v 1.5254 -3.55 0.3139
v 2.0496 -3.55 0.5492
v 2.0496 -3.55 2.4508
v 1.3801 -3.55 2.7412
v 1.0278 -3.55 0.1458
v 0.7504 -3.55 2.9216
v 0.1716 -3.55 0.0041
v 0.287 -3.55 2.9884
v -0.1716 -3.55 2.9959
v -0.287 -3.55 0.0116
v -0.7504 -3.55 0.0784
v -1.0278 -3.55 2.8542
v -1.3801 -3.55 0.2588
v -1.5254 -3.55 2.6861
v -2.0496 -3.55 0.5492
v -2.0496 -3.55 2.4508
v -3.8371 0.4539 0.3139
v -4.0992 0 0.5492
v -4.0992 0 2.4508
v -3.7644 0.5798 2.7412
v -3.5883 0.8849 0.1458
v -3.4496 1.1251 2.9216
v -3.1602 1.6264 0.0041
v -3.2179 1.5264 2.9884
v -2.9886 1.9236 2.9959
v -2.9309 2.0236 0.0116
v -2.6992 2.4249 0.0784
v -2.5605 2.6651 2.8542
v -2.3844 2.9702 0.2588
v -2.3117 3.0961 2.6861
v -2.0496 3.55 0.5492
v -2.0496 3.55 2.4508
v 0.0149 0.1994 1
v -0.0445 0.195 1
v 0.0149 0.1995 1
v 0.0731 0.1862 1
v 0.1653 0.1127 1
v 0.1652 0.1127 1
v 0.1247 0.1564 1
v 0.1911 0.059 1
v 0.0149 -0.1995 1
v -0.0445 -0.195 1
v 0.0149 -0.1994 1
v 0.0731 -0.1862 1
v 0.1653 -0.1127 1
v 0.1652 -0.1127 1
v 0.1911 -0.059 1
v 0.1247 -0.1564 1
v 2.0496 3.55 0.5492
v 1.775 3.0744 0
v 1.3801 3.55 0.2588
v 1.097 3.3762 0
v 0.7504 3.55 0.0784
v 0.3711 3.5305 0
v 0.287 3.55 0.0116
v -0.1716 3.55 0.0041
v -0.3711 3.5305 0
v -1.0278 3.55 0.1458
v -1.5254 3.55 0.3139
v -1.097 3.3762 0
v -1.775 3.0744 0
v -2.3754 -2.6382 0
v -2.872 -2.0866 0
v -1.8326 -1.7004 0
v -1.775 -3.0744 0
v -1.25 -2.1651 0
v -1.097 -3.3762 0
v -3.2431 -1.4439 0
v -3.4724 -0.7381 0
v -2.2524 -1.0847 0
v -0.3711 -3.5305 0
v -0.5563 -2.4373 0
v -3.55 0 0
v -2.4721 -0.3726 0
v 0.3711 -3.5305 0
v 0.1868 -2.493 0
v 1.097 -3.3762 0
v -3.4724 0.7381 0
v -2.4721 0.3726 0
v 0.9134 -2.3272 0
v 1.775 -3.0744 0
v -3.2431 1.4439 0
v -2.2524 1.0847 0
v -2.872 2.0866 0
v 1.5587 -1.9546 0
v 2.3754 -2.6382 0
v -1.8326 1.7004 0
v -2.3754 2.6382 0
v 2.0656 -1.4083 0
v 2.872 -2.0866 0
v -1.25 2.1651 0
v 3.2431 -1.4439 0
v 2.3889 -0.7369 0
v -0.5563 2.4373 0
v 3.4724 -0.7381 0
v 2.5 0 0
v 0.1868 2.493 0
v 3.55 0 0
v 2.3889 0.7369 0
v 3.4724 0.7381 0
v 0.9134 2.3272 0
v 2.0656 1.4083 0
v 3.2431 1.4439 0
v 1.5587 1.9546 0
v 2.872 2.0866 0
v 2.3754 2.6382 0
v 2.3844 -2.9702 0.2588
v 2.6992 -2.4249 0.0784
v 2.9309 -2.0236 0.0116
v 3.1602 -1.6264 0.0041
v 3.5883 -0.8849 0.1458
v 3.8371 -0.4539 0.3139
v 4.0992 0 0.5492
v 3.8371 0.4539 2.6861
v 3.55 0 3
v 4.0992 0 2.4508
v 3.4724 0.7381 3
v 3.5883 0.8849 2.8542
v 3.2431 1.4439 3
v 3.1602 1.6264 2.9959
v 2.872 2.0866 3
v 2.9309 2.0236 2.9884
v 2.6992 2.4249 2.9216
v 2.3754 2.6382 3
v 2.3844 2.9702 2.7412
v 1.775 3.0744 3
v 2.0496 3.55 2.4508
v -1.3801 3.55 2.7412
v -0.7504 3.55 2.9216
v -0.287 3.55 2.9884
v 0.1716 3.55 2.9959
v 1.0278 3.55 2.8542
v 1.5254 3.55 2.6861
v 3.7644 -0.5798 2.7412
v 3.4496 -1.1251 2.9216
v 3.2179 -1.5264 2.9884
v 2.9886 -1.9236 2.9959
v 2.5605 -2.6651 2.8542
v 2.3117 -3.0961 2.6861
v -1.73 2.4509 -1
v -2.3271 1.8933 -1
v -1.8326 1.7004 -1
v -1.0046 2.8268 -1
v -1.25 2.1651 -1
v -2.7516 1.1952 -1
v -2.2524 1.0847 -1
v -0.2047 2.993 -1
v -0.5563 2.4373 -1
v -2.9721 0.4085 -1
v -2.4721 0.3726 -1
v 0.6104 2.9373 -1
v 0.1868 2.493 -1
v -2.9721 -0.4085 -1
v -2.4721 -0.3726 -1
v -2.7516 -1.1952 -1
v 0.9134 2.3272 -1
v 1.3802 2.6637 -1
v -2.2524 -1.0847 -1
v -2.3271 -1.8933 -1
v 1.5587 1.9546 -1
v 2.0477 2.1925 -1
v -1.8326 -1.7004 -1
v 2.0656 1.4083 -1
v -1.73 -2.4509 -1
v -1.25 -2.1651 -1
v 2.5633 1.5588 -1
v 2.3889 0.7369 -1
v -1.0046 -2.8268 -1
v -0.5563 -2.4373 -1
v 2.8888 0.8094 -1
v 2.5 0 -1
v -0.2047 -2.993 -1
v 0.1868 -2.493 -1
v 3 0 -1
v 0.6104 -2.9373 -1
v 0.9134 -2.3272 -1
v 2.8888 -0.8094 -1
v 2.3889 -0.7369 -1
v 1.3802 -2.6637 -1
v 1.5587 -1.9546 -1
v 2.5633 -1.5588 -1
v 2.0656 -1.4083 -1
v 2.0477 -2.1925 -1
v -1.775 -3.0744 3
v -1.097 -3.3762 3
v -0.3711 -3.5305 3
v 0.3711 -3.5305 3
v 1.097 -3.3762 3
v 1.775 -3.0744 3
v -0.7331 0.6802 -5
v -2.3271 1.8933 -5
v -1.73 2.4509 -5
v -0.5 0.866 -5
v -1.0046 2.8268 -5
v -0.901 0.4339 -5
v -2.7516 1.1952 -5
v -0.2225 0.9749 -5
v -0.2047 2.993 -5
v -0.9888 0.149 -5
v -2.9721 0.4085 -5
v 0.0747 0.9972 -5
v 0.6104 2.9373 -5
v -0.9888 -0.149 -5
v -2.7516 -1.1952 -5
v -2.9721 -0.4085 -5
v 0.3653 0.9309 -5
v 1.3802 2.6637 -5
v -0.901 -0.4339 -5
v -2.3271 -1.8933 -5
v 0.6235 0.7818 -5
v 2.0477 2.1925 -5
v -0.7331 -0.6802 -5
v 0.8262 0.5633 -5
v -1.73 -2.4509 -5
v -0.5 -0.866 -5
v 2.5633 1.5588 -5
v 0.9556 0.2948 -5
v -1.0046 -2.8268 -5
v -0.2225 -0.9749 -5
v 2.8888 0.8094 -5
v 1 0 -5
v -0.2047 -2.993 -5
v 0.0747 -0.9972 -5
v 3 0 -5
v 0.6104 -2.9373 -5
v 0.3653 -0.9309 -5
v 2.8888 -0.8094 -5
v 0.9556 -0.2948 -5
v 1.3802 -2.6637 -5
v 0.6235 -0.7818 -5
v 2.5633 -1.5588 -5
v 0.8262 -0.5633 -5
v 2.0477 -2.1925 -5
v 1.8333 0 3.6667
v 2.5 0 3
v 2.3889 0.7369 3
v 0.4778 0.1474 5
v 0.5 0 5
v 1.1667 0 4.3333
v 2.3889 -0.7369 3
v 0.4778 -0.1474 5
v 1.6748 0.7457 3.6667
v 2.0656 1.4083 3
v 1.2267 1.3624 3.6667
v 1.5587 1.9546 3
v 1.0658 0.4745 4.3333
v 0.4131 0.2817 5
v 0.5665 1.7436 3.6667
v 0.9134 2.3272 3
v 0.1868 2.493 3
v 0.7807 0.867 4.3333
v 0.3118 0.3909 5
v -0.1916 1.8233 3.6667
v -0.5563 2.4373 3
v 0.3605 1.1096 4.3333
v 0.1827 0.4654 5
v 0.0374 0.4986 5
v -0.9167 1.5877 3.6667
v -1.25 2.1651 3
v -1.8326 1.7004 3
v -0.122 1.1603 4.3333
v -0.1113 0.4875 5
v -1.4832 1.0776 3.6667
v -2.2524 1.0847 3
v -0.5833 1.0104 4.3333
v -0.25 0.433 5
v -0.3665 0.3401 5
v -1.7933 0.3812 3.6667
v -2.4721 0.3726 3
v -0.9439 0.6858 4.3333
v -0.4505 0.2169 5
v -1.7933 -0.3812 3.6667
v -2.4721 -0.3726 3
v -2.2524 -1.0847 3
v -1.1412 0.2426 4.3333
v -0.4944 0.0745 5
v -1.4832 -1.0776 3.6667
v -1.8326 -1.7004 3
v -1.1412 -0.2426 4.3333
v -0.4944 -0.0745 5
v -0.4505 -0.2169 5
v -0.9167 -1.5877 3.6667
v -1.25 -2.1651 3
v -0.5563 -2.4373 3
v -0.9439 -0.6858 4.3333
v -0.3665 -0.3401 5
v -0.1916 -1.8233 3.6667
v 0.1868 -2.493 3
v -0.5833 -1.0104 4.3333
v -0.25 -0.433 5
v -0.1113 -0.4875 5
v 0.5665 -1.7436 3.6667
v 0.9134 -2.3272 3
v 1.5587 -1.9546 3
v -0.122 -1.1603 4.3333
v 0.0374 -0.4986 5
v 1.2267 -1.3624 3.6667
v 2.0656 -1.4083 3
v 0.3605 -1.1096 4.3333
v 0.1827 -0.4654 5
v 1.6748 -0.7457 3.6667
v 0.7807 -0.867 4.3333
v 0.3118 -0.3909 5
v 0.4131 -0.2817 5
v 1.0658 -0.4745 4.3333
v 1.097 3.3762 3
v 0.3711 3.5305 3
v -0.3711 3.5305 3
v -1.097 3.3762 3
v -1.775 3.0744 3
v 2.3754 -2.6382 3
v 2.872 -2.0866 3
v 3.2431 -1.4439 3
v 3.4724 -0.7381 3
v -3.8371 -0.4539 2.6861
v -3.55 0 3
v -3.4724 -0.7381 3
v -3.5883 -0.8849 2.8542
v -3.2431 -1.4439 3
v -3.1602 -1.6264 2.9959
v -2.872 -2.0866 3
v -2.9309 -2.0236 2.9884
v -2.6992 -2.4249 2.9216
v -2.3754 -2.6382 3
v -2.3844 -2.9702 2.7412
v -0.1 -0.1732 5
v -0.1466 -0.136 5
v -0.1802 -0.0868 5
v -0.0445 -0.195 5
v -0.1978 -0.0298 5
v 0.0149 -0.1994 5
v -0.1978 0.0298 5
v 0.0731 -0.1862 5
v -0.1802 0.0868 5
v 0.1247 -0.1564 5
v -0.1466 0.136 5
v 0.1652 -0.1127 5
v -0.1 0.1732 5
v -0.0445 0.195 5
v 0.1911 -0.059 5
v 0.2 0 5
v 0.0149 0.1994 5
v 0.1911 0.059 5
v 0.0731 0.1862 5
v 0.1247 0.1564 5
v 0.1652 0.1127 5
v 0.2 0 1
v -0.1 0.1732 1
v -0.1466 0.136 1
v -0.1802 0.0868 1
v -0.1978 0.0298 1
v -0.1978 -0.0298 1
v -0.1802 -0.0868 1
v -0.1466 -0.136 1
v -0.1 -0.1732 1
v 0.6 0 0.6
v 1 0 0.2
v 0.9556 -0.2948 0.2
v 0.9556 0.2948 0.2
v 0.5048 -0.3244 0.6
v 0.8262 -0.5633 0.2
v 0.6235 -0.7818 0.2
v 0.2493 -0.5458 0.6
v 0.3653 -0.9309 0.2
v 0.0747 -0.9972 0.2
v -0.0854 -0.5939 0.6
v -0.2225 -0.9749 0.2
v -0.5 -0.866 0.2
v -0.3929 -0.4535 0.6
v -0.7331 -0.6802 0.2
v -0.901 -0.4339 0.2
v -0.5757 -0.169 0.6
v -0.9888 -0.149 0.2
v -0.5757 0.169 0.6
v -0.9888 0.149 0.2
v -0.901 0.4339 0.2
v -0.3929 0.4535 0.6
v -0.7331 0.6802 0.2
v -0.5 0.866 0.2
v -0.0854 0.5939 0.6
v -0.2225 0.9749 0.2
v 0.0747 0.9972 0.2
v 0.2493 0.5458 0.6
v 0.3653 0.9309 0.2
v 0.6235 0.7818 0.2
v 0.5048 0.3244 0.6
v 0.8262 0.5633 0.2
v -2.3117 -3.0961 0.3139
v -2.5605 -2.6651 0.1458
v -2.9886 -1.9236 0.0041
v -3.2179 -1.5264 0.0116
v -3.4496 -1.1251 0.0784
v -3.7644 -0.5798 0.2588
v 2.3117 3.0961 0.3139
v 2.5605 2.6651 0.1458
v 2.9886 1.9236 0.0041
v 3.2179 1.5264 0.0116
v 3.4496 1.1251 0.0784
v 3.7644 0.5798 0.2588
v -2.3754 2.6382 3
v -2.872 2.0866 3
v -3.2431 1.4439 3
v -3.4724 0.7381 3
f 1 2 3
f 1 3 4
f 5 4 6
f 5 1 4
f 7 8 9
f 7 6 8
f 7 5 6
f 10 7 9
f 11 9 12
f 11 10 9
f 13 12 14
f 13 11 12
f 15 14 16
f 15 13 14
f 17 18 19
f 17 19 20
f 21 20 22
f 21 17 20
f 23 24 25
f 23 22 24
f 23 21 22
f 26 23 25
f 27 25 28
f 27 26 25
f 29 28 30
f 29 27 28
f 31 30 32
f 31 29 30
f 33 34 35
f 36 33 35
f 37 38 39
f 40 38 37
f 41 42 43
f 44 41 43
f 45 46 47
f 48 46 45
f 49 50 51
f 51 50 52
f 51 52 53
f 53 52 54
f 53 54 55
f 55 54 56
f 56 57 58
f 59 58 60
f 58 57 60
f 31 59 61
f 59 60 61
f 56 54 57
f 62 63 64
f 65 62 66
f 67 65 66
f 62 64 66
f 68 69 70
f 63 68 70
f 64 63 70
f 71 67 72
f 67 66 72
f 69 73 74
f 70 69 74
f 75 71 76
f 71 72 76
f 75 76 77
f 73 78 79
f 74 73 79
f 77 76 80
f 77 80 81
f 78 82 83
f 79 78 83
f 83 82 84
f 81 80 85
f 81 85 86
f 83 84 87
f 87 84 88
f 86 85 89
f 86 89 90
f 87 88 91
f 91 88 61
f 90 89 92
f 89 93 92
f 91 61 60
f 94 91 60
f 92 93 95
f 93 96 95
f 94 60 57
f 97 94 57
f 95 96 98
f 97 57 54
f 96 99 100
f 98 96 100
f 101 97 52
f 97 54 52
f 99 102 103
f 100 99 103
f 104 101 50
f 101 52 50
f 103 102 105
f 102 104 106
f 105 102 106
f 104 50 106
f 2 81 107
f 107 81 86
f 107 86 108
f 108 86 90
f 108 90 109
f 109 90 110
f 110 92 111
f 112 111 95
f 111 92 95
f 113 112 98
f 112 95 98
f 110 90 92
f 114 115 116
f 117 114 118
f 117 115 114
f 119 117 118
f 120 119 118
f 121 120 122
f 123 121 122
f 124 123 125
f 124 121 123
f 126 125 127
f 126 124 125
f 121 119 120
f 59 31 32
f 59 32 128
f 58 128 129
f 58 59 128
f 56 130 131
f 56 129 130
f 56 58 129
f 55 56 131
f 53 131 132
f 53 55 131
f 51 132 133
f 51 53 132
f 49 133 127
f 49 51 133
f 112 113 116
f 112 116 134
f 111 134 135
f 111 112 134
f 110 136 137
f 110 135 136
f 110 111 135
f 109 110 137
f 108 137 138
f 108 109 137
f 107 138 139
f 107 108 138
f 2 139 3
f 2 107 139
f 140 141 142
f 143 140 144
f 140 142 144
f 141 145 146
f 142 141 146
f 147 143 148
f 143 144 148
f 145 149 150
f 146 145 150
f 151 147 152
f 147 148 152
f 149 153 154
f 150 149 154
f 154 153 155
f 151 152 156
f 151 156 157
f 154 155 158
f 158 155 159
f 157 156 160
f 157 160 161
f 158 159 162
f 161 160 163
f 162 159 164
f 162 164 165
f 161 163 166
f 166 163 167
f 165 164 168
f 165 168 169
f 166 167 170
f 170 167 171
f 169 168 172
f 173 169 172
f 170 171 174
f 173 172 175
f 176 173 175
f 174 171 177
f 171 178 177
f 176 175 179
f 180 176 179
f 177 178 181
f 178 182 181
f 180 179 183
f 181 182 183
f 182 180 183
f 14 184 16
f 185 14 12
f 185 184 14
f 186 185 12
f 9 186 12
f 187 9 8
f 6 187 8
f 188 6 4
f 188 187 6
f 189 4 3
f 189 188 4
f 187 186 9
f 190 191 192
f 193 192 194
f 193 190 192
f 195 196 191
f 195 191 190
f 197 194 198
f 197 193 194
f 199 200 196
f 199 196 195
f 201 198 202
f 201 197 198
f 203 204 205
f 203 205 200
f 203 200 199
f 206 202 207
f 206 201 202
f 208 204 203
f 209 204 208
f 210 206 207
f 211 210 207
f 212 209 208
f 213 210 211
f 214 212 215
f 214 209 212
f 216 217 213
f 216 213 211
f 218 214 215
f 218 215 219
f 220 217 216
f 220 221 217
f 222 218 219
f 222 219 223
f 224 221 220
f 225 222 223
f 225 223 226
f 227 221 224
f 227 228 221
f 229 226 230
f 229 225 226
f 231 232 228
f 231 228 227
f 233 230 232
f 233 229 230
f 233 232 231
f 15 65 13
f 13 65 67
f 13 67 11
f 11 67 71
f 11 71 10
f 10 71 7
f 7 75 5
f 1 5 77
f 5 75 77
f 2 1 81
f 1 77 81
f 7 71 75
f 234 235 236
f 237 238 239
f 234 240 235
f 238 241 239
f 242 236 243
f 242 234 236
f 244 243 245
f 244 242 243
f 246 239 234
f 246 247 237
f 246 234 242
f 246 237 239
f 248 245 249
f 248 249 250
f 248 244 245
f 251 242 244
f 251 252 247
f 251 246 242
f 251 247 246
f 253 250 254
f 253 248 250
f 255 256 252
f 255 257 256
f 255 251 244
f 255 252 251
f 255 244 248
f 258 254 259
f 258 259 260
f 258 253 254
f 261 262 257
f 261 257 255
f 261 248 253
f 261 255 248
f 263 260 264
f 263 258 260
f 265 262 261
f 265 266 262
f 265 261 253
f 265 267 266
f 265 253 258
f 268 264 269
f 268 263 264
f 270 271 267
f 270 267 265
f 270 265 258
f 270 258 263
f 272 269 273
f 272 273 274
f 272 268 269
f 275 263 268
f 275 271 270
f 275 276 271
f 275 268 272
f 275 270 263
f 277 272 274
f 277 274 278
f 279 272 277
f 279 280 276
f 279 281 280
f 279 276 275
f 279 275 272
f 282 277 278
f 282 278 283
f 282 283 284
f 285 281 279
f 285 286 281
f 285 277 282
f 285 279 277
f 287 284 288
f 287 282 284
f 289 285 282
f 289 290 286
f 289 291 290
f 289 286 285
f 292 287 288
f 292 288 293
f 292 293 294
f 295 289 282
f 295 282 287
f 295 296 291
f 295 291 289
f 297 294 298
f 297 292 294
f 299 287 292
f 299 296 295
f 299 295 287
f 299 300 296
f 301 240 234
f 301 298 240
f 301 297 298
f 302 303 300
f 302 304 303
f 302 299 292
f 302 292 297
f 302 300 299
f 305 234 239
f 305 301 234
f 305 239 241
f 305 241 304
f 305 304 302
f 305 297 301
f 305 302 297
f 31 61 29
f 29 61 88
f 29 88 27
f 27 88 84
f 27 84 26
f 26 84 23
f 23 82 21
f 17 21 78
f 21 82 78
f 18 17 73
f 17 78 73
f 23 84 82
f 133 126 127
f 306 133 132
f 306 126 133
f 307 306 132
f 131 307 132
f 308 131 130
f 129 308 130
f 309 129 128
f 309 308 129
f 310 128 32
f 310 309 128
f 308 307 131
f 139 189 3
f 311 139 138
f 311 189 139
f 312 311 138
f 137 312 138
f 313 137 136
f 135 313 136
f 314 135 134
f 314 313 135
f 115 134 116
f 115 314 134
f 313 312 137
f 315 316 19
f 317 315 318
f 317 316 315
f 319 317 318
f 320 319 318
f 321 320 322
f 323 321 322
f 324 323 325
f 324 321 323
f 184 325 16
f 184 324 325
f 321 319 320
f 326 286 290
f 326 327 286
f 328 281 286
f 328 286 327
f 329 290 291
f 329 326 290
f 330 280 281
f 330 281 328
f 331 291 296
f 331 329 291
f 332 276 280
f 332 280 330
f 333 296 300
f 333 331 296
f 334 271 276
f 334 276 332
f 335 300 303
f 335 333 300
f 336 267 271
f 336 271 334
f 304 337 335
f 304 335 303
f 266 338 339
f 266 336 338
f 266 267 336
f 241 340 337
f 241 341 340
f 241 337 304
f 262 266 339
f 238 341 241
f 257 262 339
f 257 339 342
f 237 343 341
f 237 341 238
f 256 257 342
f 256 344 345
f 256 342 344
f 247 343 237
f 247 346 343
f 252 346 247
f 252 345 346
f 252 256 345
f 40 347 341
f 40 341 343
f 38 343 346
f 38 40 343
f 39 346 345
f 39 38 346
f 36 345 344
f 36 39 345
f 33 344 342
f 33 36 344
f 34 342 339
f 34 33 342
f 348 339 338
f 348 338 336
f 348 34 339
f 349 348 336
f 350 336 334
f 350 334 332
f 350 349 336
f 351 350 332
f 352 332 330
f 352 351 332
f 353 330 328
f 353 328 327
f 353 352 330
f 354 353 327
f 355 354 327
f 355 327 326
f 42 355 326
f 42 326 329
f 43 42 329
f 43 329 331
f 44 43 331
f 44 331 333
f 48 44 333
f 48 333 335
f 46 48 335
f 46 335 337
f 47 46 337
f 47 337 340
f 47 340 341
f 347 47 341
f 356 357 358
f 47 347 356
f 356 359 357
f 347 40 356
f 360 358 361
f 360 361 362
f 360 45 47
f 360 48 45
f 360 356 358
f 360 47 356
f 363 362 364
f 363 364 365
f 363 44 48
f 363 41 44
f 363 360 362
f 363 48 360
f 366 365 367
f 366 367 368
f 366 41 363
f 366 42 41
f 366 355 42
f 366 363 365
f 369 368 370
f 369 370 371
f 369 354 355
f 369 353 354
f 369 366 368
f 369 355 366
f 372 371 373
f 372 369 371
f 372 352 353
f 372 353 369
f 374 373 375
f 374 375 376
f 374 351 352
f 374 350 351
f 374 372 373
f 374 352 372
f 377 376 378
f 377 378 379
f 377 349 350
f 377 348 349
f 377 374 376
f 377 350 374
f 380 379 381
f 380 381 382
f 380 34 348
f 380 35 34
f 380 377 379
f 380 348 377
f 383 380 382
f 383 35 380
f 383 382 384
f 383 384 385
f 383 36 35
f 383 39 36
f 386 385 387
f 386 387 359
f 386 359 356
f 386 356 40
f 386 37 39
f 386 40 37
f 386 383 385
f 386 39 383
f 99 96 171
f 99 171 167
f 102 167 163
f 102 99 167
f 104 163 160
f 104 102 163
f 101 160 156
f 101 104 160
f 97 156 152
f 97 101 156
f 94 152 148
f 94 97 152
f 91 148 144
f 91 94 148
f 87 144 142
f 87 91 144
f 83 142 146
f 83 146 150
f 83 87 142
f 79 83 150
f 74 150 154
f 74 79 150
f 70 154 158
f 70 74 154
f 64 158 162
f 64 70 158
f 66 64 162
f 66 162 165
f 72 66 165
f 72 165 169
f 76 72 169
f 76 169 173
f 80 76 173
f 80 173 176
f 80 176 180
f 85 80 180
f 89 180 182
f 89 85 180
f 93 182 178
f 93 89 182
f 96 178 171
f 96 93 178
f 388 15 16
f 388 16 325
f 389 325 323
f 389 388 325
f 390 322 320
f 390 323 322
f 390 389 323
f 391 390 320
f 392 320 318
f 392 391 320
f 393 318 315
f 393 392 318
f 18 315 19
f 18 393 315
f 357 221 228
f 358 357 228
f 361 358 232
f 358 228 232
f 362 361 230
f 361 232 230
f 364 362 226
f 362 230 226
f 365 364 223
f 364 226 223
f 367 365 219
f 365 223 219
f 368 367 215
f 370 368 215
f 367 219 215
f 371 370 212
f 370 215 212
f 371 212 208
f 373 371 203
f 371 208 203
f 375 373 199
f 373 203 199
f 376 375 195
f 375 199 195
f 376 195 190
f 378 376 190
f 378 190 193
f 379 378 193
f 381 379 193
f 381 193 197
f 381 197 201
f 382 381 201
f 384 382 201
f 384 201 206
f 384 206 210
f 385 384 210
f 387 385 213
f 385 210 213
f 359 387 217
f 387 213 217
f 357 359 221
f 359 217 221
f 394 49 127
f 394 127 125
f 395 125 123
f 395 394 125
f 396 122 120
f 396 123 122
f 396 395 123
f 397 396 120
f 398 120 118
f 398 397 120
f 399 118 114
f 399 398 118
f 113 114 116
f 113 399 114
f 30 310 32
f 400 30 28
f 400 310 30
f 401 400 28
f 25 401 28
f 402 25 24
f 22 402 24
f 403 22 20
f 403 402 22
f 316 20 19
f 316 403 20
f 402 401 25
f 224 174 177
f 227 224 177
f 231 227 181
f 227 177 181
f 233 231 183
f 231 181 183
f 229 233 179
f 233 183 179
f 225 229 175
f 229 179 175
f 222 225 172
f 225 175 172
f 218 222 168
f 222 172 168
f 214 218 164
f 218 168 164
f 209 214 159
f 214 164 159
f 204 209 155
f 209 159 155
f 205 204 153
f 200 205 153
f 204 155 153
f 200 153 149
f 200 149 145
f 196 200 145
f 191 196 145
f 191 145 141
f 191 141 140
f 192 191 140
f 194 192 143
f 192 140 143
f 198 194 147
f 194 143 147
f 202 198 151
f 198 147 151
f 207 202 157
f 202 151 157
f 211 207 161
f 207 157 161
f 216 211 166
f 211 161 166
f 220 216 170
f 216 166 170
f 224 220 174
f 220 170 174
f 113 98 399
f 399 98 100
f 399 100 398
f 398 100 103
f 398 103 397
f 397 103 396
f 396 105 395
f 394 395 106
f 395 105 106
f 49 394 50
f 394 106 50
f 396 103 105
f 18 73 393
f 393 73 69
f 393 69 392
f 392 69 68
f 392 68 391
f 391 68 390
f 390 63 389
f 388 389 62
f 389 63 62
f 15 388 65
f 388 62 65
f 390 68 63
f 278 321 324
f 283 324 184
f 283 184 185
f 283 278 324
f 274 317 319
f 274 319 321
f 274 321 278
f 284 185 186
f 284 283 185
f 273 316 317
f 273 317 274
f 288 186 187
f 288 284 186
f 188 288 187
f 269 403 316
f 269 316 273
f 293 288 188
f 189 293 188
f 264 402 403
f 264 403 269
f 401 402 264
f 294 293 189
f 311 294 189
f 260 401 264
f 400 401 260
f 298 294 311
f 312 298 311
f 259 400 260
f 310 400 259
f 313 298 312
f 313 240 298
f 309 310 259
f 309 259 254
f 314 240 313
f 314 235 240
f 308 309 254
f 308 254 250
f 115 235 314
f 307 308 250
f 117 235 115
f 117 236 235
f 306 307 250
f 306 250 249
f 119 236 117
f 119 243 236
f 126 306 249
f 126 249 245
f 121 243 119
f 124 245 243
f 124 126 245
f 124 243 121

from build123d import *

# Parameters (mm, degrees)
F0_R      = 2.5
F0_R_2    = 0.2
F1_DEPTH  = 3
F2_SIZE   = 0.54919
F3_DEPTH  = 3.001
F4_DEPTH  = 5
F5_SIZE   = 1.99999
F6_DEPTH  = 1
F7_R      = 3
F7_R_2    = 2.5
F7_R_3    = 0.2
F8_DEPTH  = 4
F9_R      = 1
F9_R_2    = 0.2
F10_DEPTH = 6
F11_SIZE  = 0.79999


# Not quite as in the source:
# - a fillet or chamfer is up to 0.001 mm smaller than in the source, because OpenCascade refuses the exact size


with BuildPart() as f1:
    # F0 (on Top) → F1 (new body)
    with BuildSketch(Plane.XY):
        Polygon((2.0495934556, 3.55), (-2.0495934556, 3.55), (-4.0991869112, 0), (-2.0495934556, -3.55), (2.0495934556, -3.55), (4.0991869112, 0), align=None)
        Circle(F0_R, mode=Mode.SUBTRACT)
        with BuildLine():
            Line((-4.0991869112, 0), (-2.0495934556, 3.55))
            ThreePointArc((-2.0495934556, 3.55), (-3.55, 2.0495934556), (-4.0991869112, 0))
        make_face()
        with BuildLine():
            Line((-2.0495934556, -3.55), (-4.0991869112, 0))
            ThreePointArc((-4.0991869112, 0), (-3.55, -2.0495934556), (-2.0495934556, -3.55))
        make_face()
        with BuildLine():
            ThreePointArc((2.0495934556, 3.55), (0, 4.0991869112), (-2.0495934556, 3.55))
            Line((-2.0495934556, 3.55), (2.0495934556, 3.55))
        make_face()
        with BuildLine():
            ThreePointArc((4.0991869112, 0), (3.55, 2.0495934556), (2.0495934556, 3.55))
            Line((2.0495934556, 3.55), (4.0991869112, 0))
        make_face()
        with BuildLine():
            ThreePointArc((2.0495934556, -3.55), (3.55, -2.0495934556), (4.0991869112, 0))
            Line((4.0991869112, 0), (2.0495934556, -3.55))
        make_face()
        with BuildLine():
            Line((2.0495934556, -3.55), (-2.0495934556, -3.55))
            ThreePointArc((-2.0495934556, -3.55), (0, -4.0991869112), (2.0495934556, -3.55))
        make_face()
        Circle(F0_R)
        Circle(F0_R_2, mode=Mode.SUBTRACT)
    extrude(amount=F1_DEPTH)

    # F2
    f2_edges = [f1.edges().sort_by_distance(p)[0] for p in [
        (2.049593, 3.55, 3),
        (2.049593, 3.55, 0),
    ]]
    chamfer(f2_edges, length=F2_SIZE)

    # F0 (on Top) → F3 (cut, through all)
    with BuildSketch(Plane.XY):
        with BuildLine():
            Line((2.0495934556, -3.55), (-2.0495934556, -3.55))
            ThreePointArc((-2.0495934556, -3.55), (0, -4.0991869112), (2.0495934556, -3.55))
        make_face()
        with BuildLine():
            ThreePointArc((2.0495934556, -3.55), (3.55, -2.0495934556), (4.0991869112, 0))
            Line((4.0991869112, 0), (2.0495934556, -3.55))
        make_face()
        with BuildLine():
            Line((-2.0495934556, -3.55), (-4.0991869112, 0))
            ThreePointArc((-4.0991869112, 0), (-3.55, -2.0495934556), (-2.0495934556, -3.55))
        make_face()
        with BuildLine():
            ThreePointArc((4.0991869112, 0), (3.55, 2.0495934556), (2.0495934556, 3.55))
            Line((2.0495934556, 3.55), (4.0991869112, 0))
        make_face()
        with BuildLine():
            ThreePointArc((2.0495934556, 3.55), (0, 4.0991869112), (-2.0495934556, 3.55))
            Line((-2.0495934556, 3.55), (2.0495934556, 3.55))
        make_face()
        with BuildLine():
            Line((-4.0991869112, 0), (-2.0495934556, 3.55))
            ThreePointArc((-2.0495934556, 3.55), (-3.55, 2.0495934556), (-4.0991869112, 0))
        make_face()
    extrude(amount=F3_DEPTH, mode=Mode.SUBTRACT)

    # F0 (on Top) → F4 (join)
    with BuildSketch(Plane.XY):
        Circle(F0_R)
        Circle(F0_R_2, mode=Mode.SUBTRACT)
    extrude(amount=F4_DEPTH)

    # F5 (size 2 in the source; OpenCascade refuses exactly that, so slightly less here)
    f5_edges = [f1.edges().sort_by_distance(p)[0] for p in [
        (-2.5, 0, 5),
    ]]
    chamfer(f5_edges, length=F5_SIZE)

    # F0 (on Top) → F6 (join)
    with BuildSketch(Plane.XY):
        Circle(F0_R)
        Circle(F0_R_2, mode=Mode.SUBTRACT)
    extrude(amount=-F6_DEPTH)

    # F7 (on face) → F8 (join)
    with BuildSketch(Plane(origin=(0, 0, -1), x_dir=(1, 0, 0), z_dir=(0, 0, -1))):
        Circle(F7_R)
        Circle(F7_R_2, mode=Mode.SUBTRACT)
        Circle(F7_R_2)
        Circle(F7_R_3, mode=Mode.SUBTRACT)
    extrude(amount=F8_DEPTH)

    # F9 (on face) → F10 (cut)
    with BuildSketch(Plane(origin=(0, 0, -5), x_dir=(1, 0, 0), z_dir=(0, 0, -1))):
        Circle(F9_R)
        Circle(F9_R_2, mode=Mode.SUBTRACT)
    extrude(amount=-F10_DEPTH, mode=Mode.SUBTRACT)

    # F11 (size 0.8 in the source; OpenCascade refuses exactly that, so slightly less here)
    f11_edges = [f1.edges().sort_by_distance(p)[0] for p in [
        (-1, 0, 1),
    ]]
    chamfer(f11_edges, length=F11_SIZE)


solid = f1.part
